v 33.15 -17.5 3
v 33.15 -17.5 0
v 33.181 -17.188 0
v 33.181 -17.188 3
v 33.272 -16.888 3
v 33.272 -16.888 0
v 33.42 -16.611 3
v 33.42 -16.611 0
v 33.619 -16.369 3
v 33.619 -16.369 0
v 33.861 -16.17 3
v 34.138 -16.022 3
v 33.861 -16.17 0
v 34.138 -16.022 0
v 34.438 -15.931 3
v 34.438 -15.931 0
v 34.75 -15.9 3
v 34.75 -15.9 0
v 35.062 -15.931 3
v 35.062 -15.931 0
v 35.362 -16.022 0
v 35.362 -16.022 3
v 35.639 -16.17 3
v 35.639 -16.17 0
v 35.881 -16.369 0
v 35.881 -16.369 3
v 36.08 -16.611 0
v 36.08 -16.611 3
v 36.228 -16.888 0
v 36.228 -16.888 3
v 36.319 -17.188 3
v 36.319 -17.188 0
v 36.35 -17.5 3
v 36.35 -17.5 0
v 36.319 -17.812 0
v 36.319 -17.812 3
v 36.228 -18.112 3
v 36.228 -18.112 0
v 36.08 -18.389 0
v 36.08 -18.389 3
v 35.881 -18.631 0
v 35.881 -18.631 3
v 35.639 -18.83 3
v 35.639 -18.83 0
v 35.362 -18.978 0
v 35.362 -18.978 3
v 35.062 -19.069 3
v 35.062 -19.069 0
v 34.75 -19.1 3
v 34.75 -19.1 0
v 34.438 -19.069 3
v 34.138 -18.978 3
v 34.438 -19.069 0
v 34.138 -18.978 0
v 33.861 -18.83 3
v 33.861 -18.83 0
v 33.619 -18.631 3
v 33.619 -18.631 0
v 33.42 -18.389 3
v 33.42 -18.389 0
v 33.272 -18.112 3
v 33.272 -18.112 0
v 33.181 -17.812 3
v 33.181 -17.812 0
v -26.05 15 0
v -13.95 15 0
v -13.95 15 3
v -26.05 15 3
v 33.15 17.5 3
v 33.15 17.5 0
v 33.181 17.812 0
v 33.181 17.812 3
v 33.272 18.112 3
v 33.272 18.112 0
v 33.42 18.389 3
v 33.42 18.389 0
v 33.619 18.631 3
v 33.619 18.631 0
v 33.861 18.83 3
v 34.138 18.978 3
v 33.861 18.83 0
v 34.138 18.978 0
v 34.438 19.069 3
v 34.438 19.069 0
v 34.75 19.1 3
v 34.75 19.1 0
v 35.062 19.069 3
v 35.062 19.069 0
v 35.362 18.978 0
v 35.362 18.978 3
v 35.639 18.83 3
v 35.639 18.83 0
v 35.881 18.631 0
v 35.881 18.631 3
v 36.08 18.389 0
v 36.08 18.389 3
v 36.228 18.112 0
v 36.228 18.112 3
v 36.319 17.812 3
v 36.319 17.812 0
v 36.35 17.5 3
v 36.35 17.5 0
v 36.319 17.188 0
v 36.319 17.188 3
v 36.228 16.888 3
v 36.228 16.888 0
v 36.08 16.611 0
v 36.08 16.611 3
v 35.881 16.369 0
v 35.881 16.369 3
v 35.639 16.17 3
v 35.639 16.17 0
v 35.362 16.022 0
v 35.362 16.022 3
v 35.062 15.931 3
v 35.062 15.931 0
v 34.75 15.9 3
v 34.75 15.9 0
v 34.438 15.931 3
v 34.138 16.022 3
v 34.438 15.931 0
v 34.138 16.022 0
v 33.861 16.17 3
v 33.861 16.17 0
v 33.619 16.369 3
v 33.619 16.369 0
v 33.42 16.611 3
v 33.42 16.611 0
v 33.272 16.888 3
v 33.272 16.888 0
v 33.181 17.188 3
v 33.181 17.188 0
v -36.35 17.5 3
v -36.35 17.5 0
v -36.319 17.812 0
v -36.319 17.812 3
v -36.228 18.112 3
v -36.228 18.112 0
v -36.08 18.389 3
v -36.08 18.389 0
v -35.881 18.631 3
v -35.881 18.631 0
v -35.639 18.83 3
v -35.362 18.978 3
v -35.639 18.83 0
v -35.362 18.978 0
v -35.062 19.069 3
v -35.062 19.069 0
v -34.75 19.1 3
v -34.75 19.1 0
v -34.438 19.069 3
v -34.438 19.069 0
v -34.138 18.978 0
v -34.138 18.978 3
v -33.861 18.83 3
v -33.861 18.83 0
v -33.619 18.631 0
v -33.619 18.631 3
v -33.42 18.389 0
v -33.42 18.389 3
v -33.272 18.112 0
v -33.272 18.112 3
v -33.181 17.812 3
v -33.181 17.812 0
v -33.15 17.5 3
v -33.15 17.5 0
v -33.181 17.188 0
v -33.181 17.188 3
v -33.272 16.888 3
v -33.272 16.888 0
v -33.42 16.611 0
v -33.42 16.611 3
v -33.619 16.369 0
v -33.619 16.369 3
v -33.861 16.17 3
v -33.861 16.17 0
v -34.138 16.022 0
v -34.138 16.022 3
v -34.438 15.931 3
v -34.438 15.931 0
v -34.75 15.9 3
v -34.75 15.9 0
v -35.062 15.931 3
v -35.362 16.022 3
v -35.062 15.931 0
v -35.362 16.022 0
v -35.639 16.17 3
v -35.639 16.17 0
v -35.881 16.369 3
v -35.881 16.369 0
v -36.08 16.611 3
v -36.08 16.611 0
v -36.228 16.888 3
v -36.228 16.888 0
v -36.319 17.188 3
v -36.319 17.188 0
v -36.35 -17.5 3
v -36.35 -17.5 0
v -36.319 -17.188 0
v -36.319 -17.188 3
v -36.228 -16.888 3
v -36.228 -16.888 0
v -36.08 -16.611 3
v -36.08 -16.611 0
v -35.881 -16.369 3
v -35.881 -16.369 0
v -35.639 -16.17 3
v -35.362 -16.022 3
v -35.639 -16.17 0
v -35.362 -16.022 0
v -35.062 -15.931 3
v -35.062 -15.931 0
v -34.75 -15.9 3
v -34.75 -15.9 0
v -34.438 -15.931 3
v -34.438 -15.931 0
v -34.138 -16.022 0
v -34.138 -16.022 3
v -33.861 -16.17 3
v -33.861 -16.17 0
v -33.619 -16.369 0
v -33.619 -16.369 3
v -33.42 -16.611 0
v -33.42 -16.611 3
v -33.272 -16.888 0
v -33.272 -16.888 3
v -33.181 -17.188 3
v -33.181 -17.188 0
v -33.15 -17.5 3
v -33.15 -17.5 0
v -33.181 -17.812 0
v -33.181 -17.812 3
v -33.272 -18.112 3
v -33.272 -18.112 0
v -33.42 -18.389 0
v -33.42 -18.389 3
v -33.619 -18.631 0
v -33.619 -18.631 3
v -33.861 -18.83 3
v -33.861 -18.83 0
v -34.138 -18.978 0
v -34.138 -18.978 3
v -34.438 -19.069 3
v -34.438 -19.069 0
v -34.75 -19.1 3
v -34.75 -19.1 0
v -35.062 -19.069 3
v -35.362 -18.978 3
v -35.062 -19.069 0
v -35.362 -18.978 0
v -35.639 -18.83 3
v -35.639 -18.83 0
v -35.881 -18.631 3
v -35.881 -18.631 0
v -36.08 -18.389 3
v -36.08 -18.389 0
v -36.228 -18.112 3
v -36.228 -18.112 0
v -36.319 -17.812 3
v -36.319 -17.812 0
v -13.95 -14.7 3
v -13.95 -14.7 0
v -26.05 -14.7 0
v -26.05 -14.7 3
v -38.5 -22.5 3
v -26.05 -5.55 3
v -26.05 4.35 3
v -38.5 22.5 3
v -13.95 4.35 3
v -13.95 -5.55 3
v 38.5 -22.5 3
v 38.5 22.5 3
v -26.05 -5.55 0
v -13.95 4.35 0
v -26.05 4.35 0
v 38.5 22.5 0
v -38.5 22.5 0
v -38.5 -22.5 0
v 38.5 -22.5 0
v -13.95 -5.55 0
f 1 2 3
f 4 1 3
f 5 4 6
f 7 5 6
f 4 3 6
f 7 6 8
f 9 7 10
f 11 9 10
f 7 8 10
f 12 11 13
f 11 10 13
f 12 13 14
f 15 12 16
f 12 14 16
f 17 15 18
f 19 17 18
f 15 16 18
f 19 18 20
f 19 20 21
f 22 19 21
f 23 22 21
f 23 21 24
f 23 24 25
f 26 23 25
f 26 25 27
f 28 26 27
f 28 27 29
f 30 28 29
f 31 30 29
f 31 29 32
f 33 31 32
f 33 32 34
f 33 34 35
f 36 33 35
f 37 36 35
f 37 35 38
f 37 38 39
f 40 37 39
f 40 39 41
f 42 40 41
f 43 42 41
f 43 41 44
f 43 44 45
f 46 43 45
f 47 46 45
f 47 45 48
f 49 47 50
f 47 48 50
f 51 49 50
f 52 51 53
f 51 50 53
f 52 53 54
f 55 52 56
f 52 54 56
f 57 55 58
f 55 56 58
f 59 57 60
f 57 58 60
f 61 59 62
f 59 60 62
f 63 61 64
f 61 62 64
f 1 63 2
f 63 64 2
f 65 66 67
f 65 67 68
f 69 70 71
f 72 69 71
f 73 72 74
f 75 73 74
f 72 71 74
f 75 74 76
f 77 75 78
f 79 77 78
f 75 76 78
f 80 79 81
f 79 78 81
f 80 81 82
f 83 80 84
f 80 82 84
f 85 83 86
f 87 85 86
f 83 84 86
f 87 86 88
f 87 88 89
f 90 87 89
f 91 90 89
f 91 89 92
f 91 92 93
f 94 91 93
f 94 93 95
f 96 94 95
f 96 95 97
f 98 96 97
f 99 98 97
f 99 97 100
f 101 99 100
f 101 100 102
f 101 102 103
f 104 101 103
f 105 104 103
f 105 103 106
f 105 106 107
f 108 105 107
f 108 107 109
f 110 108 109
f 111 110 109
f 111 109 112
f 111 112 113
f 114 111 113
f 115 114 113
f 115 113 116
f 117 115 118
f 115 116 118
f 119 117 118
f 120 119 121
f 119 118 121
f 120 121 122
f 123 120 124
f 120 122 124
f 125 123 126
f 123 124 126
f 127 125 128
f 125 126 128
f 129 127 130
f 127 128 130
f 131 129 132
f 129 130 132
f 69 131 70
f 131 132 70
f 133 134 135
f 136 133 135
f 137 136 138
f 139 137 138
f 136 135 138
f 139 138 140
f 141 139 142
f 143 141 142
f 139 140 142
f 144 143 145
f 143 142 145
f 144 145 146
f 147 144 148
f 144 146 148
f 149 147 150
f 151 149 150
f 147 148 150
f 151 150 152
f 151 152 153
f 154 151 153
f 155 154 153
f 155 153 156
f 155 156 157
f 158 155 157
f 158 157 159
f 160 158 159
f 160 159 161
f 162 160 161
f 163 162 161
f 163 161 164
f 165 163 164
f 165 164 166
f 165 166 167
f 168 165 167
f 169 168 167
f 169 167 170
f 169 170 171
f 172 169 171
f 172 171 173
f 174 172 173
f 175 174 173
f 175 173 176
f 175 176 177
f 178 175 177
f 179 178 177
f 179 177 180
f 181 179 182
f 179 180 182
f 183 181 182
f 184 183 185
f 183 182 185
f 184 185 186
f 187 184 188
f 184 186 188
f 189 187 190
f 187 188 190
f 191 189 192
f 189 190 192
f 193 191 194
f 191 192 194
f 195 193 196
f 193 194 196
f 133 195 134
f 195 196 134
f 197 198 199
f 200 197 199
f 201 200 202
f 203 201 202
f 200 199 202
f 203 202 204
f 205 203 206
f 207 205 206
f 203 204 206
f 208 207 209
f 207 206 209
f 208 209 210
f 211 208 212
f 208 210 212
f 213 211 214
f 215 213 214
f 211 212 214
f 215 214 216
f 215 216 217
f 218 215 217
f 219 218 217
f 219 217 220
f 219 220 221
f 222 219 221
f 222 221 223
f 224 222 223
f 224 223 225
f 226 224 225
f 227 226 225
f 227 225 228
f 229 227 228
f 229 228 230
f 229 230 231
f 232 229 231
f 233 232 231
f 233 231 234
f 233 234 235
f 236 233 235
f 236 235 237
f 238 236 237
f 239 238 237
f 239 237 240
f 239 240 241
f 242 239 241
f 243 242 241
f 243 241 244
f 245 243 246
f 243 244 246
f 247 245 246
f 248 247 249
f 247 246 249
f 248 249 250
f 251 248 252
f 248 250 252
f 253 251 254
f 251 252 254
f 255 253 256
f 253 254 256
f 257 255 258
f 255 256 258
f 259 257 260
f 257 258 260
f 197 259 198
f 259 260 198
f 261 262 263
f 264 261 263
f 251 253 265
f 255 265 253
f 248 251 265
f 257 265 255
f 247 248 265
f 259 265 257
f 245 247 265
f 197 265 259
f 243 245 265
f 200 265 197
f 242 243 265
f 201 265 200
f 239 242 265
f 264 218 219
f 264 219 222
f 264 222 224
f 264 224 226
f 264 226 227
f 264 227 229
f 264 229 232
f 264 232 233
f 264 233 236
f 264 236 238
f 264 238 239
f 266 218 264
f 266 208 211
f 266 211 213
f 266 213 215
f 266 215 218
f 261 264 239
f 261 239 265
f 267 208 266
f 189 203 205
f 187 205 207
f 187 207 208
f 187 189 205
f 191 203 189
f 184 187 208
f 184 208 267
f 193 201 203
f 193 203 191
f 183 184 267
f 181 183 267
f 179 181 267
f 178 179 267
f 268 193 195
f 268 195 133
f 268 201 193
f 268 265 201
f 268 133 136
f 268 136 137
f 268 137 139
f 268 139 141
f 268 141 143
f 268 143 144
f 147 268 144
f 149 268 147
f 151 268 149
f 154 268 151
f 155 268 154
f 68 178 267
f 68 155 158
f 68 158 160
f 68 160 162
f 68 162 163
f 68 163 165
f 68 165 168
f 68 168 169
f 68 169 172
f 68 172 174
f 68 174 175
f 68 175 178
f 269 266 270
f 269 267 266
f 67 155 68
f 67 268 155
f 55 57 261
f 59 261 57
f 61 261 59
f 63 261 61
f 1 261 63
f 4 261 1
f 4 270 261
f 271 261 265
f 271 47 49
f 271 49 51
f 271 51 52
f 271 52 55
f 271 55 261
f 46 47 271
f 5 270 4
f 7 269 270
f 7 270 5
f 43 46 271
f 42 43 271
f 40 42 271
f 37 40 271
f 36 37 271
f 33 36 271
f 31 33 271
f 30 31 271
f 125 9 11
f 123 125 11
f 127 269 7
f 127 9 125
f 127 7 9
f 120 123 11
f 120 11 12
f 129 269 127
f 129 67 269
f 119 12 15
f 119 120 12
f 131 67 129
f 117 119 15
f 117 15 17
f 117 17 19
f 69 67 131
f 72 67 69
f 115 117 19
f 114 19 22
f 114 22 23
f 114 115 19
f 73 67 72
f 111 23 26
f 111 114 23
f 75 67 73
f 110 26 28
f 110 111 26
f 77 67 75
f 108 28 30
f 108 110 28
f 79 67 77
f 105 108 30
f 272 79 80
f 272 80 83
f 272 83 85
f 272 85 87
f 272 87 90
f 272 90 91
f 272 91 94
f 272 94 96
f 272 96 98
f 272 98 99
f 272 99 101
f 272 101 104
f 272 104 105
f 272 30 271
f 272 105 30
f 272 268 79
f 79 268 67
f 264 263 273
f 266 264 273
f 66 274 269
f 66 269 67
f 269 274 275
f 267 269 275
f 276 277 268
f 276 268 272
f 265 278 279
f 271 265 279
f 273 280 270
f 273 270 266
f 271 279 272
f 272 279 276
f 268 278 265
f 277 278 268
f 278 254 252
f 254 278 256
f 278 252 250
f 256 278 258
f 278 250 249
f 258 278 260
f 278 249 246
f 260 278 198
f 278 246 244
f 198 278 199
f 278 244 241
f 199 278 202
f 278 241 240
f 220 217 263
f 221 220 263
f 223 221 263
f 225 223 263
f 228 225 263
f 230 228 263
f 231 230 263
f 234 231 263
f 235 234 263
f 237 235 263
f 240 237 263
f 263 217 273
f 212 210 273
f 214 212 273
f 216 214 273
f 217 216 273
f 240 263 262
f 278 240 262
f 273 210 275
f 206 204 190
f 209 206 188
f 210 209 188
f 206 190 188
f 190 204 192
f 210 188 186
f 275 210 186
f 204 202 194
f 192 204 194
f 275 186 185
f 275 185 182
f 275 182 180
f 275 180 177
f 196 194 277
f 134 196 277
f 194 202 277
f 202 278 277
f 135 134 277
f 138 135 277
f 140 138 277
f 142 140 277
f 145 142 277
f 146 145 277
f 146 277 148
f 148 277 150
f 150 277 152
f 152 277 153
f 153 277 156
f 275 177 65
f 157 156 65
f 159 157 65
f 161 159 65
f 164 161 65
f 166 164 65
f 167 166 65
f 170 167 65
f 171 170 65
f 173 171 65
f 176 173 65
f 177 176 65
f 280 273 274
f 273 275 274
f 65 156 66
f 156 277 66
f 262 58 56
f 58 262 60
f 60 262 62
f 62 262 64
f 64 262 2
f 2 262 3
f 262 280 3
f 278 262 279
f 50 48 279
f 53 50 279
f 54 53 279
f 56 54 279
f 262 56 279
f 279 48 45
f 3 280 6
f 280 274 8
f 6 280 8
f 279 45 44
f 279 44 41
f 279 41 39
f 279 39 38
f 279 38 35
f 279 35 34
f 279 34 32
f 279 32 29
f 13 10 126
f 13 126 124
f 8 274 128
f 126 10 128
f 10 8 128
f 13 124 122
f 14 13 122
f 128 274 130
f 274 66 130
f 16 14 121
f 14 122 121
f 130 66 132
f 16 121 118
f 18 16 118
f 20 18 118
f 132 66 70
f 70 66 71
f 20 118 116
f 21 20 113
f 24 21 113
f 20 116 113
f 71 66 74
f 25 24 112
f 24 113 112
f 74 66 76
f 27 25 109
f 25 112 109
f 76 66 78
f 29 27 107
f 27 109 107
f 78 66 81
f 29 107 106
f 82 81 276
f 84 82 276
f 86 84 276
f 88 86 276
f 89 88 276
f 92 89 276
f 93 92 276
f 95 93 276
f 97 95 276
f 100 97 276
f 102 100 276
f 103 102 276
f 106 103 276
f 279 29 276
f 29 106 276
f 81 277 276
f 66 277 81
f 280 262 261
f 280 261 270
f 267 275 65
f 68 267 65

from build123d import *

# Parameters (mm, degrees)
CROQUIS1_W              = 77
CROQUIS1_H              = 45
SALIENTE_EXTRUIR1_DEPTH = 3
CORTAR_EXTRUIR1_REACH   = 5
CROQUIS2_R              = 1.6
CROQUIS2_W              = 12.1
CROQUIS2_H              = 10.65
CROQUIS2_H_2            = 9.15


with BuildPart() as part:
    # Croquis1 → Saliente-Extruir1 (new body)
    with BuildSketch(Plane.XY):
        Rectangle(CROQUIS1_W, CROQUIS1_H)
    extrude(amount=SALIENTE_EXTRUIR1_DEPTH)

    # Croquis2 → Cortar-Extruir1 (cut, up to next)
    with BuildSketch(Plane(origin=(0, 0, 0), x_dir=(-1, 0, 0), z_dir=(0, 0, -1)), mode=Mode.PRIVATE) as cortar_extruir1_sk1:
        with Locations((34.75, 17.5)):
            Circle(CROQUIS2_R)
    cortar_extruir1_tool1 = extrude(cortar_extruir1_sk1.sketch, amount=-CORTAR_EXTRUIR1_REACH, mode=Mode.PRIVATE) & part.part
    add(cortar_extruir1_tool1.solids().sort_by_distance((-34.75, 17.5, 0))[0], mode=Mode.SUBTRACT)
    # Croquis2 → Cortar-Extruir1 (cut, up to next)
    with BuildSketch(Plane(origin=(0, 0, 0), x_dir=(-1, 0, 0), z_dir=(0, 0, -1)), mode=Mode.PRIVATE) as cortar_extruir1_sk2:
        with Locations((-34.75, 17.5)):
            Circle(CROQUIS2_R)
    cortar_extruir1_tool2 = extrude(cortar_extruir1_sk2.sketch, amount=-CORTAR_EXTRUIR1_REACH, mode=Mode.PRIVATE) & part.part
    add(cortar_extruir1_tool2.solids().sort_by_distance((34.75, 17.5, 0))[0], mode=Mode.SUBTRACT)
    # Croquis2 → Cortar-Extruir1 (cut, up to next)
    with BuildSketch(Plane(origin=(0, 0, 0), x_dir=(-1, 0, 0), z_dir=(0, 0, -1)), mode=Mode.PRIVATE) as cortar_extruir1_sk3:
        with Locations((-34.75, -17.5)):
            Circle(CROQUIS2_R)
    cortar_extruir1_tool3 = extrude(cortar_extruir1_sk3.sketch, amount=-CORTAR_EXTRUIR1_REACH, mode=Mode.PRIVATE) & part.part
    add(cortar_extruir1_tool3.solids().sort_by_distance((34.75, -17.5, 0))[0], mode=Mode.SUBTRACT)
    # Croquis2 → Cortar-Extruir1 (cut, up to next)
    with BuildSketch(Plane(origin=(0, 0, 0), x_dir=(-1, 0, 0), z_dir=(0, 0, -1)), mode=Mode.PRIVATE) as cortar_extruir1_sk4:
        with Locations((34.75, -17.5)):
            Circle(CROQUIS2_R)
    cortar_extruir1_tool4 = extrude(cortar_extruir1_sk4.sketch, amount=-CORTAR_EXTRUIR1_REACH, mode=Mode.PRIVATE) & part.part
    add(cortar_extruir1_tool4.solids().sort_by_distance((-34.75, -17.5, 0))[0], mode=Mode.SUBTRACT)
    # Croquis2 → Cortar-Extruir1 (cut, up to next)
    with BuildSketch(Plane(origin=(0, 0, 0), x_dir=(-1, 0, 0), z_dir=(0, 0, -1)), mode=Mode.PRIVATE) as cortar_extruir1_sk5:
        with Locations((20, 9.675)):
            Rectangle(CROQUIS2_W, CROQUIS2_H)
    cortar_extruir1_tool5 = extrude(cortar_extruir1_sk5.sketch, amount=-CORTAR_EXTRUIR1_REACH, mode=Mode.PRIVATE) & part.part
    add(cortar_extruir1_tool5.solids().sort_by_distance((-20, 9.675, 0))[0], mode=Mode.SUBTRACT)
    # Croquis2 → Cortar-Extruir1 (cut, up to next)
    with BuildSketch(Plane(origin=(0, 0, 0), x_dir=(-1, 0, 0), z_dir=(0, 0, -1)), mode=Mode.PRIVATE) as cortar_extruir1_sk6:
        with Locations((20, -10.125)):
            Rectangle(CROQUIS2_W, CROQUIS2_H_2)
    cortar_extruir1_tool6 = extrude(cortar_extruir1_sk6.sketch, amount=-CORTAR_EXTRUIR1_REACH, mode=Mode.PRIVATE) & part.part
    add(cortar_extruir1_tool6.solids().sort_by_distance((-20, -10.125, 0))[0], mode=Mode.SUBTRACT)


solid = part.part
